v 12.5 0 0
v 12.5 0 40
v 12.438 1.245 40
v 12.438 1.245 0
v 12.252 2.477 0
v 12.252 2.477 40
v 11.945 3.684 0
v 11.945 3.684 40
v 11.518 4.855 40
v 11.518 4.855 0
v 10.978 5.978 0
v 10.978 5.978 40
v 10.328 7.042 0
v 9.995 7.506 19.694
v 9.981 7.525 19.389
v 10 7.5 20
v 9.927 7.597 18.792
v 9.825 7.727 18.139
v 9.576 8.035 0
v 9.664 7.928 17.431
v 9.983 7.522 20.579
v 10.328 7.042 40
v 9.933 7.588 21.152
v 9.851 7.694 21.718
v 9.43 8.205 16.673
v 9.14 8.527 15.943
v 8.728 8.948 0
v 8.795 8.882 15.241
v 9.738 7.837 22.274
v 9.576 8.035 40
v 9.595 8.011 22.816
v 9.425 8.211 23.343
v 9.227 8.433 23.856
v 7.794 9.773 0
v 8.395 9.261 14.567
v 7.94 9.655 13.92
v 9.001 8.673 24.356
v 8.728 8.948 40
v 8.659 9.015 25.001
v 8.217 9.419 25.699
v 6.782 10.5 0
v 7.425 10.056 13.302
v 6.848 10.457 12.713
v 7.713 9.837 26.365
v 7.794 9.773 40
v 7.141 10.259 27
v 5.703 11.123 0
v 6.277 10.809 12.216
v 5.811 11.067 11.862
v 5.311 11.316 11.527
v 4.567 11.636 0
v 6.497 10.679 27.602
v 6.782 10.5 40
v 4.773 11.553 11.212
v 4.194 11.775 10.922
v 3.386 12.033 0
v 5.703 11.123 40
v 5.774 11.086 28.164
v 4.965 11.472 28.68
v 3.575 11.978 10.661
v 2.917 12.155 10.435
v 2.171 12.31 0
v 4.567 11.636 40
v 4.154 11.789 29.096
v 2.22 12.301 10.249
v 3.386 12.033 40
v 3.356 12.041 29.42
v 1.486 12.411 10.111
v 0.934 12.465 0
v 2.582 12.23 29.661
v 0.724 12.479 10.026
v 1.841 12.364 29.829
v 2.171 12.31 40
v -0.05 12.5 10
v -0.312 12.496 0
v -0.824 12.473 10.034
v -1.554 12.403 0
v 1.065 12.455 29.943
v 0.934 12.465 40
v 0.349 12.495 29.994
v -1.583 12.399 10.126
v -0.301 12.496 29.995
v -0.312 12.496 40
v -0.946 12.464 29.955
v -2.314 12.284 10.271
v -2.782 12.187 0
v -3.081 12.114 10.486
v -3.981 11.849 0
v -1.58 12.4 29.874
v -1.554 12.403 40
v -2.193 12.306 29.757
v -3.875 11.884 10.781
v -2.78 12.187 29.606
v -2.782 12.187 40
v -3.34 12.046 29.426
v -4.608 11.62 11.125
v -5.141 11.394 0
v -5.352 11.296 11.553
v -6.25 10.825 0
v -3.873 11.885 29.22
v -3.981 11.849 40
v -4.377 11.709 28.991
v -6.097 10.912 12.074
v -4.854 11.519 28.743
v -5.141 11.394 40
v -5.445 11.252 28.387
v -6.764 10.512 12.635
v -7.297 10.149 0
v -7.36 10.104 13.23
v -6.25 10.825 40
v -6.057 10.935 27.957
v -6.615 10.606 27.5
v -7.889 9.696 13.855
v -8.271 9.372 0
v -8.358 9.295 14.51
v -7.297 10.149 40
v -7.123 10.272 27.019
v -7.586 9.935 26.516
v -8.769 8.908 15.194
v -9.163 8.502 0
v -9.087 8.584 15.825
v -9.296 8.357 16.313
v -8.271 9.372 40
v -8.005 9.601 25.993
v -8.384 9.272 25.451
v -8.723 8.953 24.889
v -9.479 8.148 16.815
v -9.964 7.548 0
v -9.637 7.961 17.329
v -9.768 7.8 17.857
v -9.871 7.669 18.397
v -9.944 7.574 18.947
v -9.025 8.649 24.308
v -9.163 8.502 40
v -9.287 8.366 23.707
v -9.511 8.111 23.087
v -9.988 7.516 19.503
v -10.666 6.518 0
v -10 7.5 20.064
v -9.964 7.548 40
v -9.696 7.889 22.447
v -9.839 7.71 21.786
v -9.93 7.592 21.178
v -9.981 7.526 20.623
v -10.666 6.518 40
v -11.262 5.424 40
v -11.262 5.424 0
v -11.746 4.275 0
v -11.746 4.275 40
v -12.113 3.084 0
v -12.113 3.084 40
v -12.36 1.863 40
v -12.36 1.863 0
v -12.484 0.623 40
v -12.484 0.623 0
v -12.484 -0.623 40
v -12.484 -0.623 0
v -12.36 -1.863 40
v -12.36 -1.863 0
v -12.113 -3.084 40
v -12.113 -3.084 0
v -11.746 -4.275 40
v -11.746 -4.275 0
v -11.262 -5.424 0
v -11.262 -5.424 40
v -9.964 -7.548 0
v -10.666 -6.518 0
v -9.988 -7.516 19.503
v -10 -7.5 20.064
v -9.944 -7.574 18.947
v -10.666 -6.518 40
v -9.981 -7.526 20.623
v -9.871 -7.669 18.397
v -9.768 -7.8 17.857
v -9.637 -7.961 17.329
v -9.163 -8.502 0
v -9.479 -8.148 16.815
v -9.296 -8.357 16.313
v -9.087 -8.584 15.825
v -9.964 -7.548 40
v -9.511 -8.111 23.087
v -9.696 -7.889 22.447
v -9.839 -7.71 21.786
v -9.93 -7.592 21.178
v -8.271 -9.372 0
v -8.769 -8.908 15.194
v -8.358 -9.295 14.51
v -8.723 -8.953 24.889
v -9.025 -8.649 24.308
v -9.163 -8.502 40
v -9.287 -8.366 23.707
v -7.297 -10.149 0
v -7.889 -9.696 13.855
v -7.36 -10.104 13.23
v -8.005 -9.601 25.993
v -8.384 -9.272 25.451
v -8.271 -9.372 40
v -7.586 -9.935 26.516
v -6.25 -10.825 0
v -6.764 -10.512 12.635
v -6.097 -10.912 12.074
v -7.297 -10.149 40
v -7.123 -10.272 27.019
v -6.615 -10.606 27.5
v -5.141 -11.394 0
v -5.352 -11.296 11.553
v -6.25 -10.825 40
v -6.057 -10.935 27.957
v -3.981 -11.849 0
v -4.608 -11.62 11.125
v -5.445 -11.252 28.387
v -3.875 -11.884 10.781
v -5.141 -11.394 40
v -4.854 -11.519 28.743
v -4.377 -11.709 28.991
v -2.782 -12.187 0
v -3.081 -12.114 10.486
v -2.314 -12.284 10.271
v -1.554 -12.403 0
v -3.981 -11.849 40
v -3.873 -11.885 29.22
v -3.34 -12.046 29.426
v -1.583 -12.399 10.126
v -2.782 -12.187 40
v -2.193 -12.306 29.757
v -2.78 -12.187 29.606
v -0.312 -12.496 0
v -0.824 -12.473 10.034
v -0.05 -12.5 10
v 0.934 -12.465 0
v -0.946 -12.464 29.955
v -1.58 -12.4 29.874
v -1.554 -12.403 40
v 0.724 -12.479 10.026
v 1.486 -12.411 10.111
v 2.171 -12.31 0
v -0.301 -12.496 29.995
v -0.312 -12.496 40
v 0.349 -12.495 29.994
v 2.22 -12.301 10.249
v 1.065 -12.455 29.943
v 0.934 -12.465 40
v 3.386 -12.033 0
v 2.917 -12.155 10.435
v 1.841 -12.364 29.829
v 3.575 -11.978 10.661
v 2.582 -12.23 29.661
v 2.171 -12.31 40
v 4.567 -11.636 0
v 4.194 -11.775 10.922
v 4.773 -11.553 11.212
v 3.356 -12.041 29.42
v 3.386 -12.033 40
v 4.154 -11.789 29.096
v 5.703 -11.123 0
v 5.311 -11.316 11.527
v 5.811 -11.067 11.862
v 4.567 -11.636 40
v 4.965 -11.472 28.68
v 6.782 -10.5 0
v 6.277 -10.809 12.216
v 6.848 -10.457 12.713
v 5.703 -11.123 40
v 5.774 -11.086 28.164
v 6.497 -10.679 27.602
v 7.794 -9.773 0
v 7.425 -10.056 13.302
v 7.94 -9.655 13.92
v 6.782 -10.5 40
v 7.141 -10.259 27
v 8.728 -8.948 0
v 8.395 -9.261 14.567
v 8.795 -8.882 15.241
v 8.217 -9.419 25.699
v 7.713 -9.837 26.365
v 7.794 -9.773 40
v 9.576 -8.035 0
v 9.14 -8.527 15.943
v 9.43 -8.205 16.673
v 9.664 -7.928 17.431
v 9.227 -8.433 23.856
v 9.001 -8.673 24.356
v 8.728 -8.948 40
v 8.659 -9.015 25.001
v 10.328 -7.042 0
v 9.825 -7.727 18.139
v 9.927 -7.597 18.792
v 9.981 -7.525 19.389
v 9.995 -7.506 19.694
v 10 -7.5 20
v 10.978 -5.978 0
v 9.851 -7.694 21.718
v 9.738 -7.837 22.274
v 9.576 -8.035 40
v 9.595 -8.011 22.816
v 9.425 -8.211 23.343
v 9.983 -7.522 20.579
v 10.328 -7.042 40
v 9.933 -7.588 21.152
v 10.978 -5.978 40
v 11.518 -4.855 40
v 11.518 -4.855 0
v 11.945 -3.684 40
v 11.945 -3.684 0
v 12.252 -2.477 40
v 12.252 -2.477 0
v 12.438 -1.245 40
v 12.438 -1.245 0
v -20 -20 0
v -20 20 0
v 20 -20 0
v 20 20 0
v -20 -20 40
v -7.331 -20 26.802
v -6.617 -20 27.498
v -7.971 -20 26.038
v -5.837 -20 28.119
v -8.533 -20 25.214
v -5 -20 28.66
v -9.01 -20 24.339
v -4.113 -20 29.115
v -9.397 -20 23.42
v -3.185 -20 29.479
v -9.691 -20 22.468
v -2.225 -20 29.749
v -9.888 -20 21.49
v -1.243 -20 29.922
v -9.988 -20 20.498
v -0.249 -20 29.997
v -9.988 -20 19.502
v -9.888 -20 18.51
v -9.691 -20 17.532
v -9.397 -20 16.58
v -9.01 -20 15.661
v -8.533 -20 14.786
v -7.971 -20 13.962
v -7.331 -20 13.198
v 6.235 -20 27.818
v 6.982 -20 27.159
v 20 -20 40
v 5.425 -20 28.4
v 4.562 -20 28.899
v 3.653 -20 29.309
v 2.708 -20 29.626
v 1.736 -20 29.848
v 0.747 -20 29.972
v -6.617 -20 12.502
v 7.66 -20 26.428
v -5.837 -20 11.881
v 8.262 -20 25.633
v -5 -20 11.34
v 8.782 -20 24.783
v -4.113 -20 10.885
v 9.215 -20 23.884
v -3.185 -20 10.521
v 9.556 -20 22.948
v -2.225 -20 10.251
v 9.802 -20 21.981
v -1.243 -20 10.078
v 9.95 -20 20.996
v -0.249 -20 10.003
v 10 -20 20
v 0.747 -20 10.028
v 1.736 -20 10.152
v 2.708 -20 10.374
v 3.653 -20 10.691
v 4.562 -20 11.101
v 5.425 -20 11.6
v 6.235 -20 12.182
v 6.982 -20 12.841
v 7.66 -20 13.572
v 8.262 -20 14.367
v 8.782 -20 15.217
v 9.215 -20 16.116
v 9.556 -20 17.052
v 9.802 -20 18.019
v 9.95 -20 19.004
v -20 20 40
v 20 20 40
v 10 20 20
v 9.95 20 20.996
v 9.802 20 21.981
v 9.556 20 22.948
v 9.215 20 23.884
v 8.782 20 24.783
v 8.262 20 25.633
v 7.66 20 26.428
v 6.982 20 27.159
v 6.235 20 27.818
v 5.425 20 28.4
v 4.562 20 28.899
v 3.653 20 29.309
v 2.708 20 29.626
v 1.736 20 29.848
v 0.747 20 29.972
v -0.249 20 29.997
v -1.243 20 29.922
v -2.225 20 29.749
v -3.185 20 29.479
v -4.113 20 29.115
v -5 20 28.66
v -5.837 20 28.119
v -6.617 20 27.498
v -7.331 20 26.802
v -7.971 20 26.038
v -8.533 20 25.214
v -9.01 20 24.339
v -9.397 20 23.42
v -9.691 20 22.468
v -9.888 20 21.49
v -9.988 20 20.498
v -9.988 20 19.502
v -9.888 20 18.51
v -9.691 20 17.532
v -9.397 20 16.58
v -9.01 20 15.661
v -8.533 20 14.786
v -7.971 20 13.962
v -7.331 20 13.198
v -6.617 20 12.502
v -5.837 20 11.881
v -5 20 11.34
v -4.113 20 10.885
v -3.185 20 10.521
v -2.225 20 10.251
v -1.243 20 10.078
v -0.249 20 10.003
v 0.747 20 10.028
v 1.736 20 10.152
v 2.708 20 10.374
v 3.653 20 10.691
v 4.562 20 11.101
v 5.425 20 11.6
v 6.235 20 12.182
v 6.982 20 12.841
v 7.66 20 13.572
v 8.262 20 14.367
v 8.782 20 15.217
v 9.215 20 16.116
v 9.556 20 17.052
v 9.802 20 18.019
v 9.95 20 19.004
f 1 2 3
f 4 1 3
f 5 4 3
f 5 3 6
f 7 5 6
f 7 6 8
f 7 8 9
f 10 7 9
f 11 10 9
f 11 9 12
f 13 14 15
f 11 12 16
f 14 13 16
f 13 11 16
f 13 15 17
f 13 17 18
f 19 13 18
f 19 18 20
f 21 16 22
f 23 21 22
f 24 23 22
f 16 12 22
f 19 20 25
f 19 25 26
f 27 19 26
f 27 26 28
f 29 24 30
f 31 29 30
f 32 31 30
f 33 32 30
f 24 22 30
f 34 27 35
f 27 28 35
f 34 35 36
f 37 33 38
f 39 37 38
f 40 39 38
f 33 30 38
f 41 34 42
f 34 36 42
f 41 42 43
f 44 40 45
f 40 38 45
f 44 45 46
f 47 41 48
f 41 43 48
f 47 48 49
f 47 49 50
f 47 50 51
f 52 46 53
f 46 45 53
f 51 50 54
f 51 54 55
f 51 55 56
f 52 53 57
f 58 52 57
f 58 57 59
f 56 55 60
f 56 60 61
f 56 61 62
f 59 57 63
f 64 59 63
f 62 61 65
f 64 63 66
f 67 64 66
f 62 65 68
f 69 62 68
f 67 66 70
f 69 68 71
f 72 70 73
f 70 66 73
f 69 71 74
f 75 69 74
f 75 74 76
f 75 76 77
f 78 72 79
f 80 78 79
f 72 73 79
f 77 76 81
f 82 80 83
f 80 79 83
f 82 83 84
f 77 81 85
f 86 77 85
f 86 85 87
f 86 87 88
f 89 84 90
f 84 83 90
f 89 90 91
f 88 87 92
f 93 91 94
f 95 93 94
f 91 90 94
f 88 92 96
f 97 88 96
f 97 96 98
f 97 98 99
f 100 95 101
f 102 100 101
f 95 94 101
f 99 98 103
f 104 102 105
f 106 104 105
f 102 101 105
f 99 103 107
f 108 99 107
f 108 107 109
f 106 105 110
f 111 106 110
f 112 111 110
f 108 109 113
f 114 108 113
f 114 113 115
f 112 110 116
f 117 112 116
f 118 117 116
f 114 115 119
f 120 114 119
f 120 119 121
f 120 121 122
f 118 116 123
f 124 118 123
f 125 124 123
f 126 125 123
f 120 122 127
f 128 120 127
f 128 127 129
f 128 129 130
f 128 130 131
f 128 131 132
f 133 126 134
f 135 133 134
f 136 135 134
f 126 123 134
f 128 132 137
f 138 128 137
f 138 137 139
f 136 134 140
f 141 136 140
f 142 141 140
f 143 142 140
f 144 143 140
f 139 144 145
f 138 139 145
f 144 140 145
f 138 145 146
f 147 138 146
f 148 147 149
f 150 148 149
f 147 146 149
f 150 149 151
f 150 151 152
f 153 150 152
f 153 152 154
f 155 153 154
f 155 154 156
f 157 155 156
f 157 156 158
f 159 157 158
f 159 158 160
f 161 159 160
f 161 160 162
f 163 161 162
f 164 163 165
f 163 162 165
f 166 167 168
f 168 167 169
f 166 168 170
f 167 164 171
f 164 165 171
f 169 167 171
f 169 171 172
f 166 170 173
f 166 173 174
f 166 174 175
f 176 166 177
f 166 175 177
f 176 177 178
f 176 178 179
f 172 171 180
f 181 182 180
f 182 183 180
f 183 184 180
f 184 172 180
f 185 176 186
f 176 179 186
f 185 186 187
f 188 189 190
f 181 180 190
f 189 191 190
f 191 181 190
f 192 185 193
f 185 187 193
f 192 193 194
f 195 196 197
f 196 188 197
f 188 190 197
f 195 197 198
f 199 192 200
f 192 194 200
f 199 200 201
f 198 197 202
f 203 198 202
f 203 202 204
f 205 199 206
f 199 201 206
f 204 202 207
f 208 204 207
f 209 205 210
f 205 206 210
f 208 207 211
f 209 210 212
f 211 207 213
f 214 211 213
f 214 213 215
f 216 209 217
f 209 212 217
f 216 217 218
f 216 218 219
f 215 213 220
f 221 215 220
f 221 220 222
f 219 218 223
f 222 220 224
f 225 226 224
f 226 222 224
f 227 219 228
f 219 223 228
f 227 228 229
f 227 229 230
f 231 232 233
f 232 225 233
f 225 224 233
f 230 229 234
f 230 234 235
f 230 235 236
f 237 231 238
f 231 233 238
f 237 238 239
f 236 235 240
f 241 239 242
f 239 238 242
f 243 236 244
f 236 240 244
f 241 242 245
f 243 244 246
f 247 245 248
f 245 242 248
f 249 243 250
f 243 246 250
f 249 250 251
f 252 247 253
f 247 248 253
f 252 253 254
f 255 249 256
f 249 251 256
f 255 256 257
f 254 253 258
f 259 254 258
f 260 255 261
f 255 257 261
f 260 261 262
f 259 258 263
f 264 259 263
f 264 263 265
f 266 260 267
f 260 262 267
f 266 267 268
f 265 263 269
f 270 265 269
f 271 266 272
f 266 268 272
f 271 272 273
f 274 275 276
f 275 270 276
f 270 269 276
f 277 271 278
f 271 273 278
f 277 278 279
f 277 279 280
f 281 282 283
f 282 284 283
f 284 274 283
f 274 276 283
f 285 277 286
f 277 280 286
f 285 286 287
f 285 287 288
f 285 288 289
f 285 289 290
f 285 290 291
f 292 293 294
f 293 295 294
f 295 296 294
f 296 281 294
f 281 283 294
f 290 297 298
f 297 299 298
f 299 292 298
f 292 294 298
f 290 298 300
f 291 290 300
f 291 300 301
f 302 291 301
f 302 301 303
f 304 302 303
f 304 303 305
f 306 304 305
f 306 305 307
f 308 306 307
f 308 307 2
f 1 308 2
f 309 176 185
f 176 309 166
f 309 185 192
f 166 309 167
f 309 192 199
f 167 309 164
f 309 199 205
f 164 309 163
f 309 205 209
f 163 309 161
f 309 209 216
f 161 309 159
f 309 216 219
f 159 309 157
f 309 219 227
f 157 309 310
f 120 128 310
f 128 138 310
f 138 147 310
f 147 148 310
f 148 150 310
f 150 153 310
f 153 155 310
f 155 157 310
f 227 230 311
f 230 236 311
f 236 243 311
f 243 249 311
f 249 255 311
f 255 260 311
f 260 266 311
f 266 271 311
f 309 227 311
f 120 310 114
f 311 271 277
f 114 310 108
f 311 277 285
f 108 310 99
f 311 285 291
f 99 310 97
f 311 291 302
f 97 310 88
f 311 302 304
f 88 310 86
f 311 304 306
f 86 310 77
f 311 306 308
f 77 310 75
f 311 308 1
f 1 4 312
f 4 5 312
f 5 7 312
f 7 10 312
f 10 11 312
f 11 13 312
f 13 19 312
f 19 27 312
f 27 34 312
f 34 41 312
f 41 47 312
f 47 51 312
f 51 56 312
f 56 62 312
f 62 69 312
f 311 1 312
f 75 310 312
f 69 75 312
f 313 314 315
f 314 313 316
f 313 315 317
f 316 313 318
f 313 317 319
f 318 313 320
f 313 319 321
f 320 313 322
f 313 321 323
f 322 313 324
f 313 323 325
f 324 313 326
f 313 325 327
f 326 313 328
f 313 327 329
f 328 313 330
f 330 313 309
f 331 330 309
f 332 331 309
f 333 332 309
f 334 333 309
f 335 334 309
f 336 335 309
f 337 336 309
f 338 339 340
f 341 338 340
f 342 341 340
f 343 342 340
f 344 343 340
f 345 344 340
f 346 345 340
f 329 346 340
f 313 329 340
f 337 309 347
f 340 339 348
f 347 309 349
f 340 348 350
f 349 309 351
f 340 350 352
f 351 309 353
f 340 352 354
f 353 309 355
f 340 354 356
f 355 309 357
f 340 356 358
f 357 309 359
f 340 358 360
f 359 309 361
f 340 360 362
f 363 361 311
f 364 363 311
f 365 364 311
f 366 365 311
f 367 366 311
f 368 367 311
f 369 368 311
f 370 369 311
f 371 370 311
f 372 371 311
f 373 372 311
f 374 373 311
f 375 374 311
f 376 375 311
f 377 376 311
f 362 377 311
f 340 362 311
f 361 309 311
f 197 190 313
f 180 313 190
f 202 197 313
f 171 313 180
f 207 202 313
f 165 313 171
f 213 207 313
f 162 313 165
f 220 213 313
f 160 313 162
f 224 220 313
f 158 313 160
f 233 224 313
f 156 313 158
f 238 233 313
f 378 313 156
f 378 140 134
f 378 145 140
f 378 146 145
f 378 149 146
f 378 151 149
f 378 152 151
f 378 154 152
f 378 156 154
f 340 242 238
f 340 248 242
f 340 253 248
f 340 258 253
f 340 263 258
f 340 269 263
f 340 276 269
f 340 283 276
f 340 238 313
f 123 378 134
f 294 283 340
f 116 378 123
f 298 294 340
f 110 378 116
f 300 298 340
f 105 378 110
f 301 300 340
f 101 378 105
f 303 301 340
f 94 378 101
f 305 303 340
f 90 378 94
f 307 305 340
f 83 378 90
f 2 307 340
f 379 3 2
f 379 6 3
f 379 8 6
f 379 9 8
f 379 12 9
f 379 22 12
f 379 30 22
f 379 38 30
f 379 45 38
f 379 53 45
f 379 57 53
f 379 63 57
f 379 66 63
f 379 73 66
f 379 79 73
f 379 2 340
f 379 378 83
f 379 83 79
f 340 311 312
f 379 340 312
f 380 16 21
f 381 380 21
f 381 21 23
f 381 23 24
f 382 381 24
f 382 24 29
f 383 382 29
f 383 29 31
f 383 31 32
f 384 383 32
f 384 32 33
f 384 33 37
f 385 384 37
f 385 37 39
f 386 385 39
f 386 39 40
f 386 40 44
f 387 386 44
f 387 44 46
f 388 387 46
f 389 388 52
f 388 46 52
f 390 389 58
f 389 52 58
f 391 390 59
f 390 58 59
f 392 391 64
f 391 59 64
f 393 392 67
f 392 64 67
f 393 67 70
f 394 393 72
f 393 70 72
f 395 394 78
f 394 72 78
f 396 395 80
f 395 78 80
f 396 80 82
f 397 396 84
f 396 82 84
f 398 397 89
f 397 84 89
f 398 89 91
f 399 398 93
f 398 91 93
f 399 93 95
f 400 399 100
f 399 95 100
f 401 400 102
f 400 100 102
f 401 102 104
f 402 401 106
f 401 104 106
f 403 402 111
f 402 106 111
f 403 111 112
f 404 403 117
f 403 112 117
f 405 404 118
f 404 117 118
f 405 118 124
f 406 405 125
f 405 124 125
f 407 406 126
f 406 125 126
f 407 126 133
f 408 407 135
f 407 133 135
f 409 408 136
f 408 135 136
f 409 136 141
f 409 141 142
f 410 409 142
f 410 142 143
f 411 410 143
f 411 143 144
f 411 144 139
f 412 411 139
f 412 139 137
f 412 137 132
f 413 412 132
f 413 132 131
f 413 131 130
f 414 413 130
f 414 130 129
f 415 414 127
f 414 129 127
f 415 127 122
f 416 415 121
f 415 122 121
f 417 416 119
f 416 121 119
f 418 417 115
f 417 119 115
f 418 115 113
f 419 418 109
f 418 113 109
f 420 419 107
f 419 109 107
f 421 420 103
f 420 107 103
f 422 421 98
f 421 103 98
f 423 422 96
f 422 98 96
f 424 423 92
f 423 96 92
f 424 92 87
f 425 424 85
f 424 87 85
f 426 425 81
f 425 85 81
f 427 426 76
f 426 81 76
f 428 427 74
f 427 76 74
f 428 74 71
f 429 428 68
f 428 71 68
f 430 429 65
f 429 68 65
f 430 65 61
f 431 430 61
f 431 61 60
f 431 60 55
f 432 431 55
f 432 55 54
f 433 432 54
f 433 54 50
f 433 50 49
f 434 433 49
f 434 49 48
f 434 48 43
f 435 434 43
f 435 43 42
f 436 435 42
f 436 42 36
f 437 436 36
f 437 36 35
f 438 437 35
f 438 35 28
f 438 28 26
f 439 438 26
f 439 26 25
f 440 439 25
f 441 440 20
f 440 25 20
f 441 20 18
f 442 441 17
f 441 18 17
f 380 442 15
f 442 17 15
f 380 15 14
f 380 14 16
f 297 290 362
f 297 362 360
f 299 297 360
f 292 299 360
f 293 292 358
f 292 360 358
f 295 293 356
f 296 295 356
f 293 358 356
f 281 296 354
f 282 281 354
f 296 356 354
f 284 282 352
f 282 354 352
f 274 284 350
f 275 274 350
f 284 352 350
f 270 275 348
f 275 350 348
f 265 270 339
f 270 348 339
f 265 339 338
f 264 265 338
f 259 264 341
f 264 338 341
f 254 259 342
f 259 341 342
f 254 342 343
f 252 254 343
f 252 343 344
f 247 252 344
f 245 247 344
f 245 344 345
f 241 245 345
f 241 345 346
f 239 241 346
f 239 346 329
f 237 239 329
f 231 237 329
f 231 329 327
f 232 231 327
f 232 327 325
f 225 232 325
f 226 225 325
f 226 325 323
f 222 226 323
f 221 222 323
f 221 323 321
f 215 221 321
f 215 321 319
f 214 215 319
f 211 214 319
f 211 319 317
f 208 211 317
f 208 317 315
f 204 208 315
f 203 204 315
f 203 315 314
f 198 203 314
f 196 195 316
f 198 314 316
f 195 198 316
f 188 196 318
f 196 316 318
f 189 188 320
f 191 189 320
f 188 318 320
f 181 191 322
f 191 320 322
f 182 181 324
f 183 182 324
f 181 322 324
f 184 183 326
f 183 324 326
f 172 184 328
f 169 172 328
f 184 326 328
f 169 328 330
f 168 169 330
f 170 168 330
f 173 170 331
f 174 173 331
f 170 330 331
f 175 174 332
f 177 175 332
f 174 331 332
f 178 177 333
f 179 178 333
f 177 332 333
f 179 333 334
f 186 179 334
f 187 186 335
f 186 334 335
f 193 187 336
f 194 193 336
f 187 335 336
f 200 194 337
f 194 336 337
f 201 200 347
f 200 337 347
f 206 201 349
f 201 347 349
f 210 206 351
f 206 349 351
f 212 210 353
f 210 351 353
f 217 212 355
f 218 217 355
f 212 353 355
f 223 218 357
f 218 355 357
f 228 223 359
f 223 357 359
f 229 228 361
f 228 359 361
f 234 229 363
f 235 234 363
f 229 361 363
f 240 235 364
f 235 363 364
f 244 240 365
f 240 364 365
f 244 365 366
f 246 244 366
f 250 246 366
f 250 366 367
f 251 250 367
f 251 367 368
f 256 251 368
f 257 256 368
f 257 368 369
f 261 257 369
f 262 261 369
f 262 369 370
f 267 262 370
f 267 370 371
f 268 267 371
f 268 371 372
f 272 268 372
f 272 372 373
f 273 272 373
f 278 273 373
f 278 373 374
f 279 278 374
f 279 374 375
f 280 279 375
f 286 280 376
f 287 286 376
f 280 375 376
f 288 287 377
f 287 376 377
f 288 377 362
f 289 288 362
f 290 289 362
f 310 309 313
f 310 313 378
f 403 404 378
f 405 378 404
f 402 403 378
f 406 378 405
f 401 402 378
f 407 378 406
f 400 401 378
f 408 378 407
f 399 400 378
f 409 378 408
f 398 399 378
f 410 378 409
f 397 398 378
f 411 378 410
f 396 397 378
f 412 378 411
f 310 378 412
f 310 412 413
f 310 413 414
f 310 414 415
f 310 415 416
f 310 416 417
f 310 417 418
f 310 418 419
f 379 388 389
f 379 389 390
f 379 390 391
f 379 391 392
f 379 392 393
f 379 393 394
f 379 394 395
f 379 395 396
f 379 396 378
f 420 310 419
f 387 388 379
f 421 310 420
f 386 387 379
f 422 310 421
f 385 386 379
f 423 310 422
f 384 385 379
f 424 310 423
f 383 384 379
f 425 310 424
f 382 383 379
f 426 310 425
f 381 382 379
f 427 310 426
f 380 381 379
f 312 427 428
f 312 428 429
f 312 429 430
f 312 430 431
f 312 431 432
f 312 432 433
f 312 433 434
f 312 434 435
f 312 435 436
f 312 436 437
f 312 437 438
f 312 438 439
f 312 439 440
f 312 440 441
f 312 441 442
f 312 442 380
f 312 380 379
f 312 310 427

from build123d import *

# Parameters (mm, degrees)
SKETCH_W        = 40
SKETCH_H        = 40
PAD_DEPTH       = 40
SKETCH001_R     = 12.5
POCKET_DEPTH    = 40.001
SKETCH002_R     = 10
POCKET001_DEPTH = 40.001


with BuildPart() as part:
    # Sketch → Pad (new body)
    with BuildSketch(Plane.XY):
        Rectangle(SKETCH_W, SKETCH_H)
    extrude(amount=PAD_DEPTH)

    # Sketch001 (on Face6 of Pad) → Pocket (cut, through all)
    with BuildSketch(Plane.XY.offset(40)):
        Circle(SKETCH001_R)
    extrude(amount=-POCKET_DEPTH, mode=Mode.SUBTRACT)

    # Sketch002 (on Face6 of Pocket) → Pocket001 (cut, through all)
    with BuildSketch(Plane.XZ.offset(20)):
        with Locations((0, 20)):
            Circle(SKETCH002_R)
    extrude(amount=-POCKET001_DEPTH, mode=Mode.SUBTRACT)


solid = part.part
